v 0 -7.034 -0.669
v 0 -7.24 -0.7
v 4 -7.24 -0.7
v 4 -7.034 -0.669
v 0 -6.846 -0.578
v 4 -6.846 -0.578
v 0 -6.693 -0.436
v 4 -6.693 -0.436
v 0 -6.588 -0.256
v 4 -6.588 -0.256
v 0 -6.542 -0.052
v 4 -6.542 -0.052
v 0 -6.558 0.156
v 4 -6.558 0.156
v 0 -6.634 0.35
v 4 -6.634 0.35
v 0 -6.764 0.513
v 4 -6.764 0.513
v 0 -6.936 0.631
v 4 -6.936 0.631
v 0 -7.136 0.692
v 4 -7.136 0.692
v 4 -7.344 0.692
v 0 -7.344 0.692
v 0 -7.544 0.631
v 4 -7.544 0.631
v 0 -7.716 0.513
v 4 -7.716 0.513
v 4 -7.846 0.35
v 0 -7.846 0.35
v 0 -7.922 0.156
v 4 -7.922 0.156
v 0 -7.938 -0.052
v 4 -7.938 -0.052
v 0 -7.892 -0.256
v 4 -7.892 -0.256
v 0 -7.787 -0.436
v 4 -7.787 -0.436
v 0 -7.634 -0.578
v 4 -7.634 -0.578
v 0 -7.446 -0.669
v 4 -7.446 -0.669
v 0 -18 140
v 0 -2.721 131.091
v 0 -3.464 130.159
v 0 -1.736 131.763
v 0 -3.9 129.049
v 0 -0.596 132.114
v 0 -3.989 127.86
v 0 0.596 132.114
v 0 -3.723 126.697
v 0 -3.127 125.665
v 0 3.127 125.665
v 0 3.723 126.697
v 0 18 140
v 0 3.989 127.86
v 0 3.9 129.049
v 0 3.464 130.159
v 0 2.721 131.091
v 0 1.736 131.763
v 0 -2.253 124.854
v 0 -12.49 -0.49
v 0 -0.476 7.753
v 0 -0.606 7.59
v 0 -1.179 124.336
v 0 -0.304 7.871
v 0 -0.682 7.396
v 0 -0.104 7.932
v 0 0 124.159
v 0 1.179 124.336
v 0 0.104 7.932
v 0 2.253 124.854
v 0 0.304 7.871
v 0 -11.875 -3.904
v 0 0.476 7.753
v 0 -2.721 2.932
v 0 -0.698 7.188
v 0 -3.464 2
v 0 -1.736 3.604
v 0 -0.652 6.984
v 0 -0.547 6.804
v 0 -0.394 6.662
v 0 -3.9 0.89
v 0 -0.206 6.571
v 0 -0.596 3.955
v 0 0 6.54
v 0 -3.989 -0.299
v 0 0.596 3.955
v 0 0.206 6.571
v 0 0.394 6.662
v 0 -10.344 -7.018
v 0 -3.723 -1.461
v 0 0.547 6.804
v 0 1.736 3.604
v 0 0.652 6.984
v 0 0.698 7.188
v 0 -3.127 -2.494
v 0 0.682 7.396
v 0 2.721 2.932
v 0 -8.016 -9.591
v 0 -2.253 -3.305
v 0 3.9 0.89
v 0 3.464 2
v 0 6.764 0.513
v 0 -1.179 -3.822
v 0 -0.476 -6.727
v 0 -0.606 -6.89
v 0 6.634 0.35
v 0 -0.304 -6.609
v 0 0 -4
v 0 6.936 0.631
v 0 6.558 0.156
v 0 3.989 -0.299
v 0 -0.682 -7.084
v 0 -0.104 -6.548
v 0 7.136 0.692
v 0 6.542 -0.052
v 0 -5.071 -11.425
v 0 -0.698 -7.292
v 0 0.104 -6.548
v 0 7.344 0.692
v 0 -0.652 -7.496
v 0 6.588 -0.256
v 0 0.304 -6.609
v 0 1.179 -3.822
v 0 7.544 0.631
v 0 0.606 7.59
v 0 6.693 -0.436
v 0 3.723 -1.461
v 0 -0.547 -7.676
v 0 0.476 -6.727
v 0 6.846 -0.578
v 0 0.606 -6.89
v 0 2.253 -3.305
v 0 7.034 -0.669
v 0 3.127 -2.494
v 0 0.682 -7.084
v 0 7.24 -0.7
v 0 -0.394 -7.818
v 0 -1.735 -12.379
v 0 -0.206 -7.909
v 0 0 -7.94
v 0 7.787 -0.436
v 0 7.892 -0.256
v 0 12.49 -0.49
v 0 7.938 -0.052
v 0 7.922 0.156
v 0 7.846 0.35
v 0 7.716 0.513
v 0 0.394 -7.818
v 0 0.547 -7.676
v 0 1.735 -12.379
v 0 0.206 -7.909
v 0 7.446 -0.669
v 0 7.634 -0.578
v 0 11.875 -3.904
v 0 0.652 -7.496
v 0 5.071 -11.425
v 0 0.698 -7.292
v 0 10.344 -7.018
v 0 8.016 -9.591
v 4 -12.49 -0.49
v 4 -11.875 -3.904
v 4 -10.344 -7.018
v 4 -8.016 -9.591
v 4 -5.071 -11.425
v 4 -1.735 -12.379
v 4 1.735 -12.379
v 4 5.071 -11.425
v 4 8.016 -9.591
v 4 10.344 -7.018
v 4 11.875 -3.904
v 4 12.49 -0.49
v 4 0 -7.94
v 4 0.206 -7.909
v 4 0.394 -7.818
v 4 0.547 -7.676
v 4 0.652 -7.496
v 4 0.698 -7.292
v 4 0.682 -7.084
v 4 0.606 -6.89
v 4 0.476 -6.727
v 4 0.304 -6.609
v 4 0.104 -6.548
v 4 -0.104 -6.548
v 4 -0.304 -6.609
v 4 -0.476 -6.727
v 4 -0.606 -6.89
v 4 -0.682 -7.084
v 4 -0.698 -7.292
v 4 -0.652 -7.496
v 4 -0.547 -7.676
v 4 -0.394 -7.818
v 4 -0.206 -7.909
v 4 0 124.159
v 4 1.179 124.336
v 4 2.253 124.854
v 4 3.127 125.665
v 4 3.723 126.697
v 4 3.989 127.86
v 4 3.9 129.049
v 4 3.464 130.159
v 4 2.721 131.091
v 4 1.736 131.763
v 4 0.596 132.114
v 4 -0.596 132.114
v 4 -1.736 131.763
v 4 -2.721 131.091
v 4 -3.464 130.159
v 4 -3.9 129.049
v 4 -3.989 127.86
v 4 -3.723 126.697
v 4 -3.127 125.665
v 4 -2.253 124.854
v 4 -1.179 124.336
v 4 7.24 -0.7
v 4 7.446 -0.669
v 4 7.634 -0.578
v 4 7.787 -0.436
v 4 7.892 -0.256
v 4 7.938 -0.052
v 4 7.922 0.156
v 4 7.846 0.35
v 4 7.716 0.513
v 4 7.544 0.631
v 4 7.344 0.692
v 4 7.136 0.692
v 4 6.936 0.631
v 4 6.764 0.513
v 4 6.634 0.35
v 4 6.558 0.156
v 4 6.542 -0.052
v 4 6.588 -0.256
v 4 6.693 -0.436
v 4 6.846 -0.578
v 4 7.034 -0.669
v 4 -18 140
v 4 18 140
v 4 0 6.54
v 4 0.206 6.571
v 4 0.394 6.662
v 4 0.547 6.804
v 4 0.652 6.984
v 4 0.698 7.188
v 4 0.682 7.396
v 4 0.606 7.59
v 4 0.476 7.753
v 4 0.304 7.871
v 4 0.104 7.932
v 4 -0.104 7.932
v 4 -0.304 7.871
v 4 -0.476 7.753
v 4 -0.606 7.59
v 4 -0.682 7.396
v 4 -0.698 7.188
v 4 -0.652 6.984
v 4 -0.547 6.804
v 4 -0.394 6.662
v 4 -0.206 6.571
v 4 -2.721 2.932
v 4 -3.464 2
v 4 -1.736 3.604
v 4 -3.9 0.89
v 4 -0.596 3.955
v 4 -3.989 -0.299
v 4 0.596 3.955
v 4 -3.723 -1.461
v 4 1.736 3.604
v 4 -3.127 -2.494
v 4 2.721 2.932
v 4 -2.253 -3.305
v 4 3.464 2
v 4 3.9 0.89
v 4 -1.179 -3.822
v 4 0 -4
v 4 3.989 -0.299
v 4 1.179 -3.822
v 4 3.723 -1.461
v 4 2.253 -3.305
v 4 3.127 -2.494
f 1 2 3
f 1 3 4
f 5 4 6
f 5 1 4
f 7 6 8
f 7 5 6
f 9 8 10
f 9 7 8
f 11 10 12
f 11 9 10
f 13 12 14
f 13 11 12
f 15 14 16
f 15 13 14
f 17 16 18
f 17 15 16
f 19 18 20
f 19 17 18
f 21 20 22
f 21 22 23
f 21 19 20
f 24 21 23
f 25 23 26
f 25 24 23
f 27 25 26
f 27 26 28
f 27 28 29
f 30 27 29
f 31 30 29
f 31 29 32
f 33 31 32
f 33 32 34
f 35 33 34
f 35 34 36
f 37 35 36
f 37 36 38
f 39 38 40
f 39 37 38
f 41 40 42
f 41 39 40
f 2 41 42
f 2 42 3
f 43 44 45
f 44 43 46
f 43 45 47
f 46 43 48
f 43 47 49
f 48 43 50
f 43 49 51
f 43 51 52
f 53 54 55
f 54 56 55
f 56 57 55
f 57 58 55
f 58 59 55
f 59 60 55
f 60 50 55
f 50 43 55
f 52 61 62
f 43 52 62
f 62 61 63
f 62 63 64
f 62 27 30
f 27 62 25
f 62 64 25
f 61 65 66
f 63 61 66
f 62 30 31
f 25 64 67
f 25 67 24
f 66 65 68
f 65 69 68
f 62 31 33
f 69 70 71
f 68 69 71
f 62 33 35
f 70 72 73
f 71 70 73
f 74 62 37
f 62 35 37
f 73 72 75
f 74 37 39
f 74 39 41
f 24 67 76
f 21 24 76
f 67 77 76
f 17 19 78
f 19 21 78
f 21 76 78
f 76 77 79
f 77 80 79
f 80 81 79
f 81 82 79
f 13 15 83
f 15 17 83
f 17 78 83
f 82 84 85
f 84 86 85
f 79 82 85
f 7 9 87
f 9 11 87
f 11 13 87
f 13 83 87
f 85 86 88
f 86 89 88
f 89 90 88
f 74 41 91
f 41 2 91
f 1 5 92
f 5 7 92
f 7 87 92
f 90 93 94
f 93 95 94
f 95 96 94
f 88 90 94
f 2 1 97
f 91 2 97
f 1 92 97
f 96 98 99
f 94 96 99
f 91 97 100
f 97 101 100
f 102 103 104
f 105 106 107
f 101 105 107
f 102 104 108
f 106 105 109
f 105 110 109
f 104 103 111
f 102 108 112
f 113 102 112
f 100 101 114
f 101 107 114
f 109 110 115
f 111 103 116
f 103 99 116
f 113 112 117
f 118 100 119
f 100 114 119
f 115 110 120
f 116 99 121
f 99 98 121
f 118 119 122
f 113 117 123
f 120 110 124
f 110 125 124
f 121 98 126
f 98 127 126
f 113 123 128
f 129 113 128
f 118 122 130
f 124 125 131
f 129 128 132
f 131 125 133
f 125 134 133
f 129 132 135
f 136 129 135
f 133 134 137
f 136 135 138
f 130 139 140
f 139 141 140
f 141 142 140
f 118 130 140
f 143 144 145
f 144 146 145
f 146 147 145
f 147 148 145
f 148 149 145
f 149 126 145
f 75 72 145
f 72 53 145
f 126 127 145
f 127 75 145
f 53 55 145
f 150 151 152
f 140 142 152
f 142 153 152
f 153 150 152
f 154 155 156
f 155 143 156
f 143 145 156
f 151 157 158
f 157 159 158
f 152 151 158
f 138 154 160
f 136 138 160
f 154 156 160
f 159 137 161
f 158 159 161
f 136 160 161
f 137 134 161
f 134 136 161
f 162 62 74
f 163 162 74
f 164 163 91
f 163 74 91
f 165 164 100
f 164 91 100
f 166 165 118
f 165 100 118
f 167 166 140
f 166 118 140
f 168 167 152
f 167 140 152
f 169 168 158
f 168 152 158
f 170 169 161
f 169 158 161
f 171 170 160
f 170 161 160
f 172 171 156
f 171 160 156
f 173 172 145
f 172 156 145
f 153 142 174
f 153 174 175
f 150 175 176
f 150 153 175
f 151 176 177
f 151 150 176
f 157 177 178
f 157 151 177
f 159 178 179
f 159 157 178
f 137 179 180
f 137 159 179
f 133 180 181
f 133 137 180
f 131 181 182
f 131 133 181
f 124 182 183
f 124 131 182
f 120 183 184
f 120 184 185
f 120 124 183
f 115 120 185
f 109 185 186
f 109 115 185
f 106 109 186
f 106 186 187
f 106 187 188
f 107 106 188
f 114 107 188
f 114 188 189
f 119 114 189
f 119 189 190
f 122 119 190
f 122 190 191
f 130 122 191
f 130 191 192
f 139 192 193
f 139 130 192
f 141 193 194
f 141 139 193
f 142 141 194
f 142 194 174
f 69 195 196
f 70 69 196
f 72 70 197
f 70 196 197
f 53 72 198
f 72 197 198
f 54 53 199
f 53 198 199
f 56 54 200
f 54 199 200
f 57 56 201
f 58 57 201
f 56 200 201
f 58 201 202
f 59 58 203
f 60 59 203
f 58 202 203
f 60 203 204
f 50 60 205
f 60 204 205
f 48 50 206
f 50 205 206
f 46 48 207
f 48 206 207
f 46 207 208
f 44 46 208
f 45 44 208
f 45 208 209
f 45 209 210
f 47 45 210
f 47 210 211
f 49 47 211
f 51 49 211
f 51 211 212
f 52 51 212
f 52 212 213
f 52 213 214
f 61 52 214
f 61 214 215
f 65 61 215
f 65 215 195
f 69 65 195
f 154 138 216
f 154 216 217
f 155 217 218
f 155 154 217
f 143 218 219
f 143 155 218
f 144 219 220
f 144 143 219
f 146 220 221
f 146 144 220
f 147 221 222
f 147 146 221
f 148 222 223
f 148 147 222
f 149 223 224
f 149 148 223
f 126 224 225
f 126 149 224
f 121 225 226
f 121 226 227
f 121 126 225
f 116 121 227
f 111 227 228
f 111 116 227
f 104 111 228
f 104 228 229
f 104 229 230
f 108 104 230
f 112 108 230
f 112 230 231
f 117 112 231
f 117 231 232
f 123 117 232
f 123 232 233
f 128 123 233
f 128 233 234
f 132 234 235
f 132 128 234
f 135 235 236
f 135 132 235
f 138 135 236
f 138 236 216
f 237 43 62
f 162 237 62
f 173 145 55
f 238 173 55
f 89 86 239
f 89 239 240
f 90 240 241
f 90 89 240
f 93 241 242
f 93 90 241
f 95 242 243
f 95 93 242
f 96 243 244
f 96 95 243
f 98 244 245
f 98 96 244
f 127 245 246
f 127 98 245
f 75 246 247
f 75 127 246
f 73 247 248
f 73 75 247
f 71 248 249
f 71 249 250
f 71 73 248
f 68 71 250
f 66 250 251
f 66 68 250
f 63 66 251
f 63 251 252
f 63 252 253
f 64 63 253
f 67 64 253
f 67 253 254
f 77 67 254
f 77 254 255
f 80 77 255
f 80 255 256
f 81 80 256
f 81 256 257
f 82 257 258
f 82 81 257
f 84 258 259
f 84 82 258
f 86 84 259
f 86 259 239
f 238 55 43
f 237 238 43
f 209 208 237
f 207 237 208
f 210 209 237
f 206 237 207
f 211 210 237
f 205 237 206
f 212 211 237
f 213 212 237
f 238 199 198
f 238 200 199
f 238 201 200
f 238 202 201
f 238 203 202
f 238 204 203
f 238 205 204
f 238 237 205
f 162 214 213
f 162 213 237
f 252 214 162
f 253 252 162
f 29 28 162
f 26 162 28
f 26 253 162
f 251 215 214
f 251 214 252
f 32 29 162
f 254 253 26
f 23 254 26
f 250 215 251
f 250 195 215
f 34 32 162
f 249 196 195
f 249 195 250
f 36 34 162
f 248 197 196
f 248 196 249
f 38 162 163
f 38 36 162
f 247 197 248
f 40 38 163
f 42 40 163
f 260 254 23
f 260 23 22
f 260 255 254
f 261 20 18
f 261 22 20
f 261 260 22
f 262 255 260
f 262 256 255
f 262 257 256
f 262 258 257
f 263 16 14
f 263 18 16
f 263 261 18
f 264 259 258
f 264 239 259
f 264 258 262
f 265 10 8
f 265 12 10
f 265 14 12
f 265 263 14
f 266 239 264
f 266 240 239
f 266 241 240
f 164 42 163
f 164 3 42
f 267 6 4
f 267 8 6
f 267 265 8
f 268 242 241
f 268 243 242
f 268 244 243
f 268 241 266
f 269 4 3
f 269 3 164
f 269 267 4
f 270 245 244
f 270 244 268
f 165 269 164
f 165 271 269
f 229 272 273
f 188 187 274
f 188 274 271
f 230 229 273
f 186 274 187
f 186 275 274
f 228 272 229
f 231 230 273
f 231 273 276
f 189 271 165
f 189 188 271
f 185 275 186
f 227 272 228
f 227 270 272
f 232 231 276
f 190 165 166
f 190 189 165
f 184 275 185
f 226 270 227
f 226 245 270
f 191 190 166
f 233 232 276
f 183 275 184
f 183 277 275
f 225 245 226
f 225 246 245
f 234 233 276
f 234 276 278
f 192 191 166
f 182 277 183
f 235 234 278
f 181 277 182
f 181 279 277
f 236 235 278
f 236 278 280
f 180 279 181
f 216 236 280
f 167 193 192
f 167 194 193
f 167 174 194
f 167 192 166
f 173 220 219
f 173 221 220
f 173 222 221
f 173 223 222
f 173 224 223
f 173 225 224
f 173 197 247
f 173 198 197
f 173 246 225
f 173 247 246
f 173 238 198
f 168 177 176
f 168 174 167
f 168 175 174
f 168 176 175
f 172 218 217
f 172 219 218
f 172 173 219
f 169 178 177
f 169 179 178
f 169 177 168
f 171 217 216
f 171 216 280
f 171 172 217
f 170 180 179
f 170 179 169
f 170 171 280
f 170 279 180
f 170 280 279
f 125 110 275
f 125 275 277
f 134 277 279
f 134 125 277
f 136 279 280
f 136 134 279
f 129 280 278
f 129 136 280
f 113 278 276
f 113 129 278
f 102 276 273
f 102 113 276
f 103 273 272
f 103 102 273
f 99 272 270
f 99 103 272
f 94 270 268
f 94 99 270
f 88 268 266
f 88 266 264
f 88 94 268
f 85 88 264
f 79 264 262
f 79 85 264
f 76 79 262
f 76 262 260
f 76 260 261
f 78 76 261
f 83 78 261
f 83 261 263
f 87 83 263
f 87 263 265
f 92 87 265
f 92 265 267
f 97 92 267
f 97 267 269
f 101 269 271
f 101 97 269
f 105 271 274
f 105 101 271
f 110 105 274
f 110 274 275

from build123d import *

# Parameters (mm, degrees)
SKETCH1_R           = 4
SKETCH1_R_2         = 0.7
BOSS_EXTRUDE1_DEPTH = 4
SKETCH2_R           = 4
CUT_EXTRUDE1_DEPTH  = 10


with BuildPart() as part:
    # Sketch1 → Boss-Extrude1 (new body)
    with BuildSketch(Plane(origin=(0, 0, 0), x_dir=(0, 0, -1), z_dir=(1, 0, 0))):
        with BuildLine():
            Line((-140, 18), (-140, -18))
            Line((-140, -18), (0.489836976, -12.490398702))
            ThreePointArc((0.489836976, -12.490398702), (12.5, 0), (0.489836976, 12.490398702))
            Line((0.489836976, 12.490398702), (-140, 18))
        make_face()
        Circle(SKETCH1_R, mode=Mode.SUBTRACT)
        with Locations((-7.24, 0)):
            Circle(SKETCH1_R_2, mode=Mode.SUBTRACT)
        with Locations((0, 7.24)):
            Circle(SKETCH1_R_2, mode=Mode.SUBTRACT)
        with Locations((7.24, 0)):
            Circle(SKETCH1_R_2, mode=Mode.SUBTRACT)
        with Locations((0, -7.24)):
            Circle(SKETCH1_R_2, mode=Mode.SUBTRACT)
    extrude(amount=BOSS_EXTRUDE1_DEPTH)

    # Sketch2 → Cut-Extrude1 (cut)
    with BuildSketch(Plane(origin=(4, 0, 0), x_dir=(0, 0, -1), z_dir=(1, 0, 0))):
        with Locations((-128.15876547, 0)):
            Circle(SKETCH2_R)
    extrude(amount=-CUT_EXTRUDE1_DEPTH, mode=Mode.SUBTRACT)


solid = part.part
